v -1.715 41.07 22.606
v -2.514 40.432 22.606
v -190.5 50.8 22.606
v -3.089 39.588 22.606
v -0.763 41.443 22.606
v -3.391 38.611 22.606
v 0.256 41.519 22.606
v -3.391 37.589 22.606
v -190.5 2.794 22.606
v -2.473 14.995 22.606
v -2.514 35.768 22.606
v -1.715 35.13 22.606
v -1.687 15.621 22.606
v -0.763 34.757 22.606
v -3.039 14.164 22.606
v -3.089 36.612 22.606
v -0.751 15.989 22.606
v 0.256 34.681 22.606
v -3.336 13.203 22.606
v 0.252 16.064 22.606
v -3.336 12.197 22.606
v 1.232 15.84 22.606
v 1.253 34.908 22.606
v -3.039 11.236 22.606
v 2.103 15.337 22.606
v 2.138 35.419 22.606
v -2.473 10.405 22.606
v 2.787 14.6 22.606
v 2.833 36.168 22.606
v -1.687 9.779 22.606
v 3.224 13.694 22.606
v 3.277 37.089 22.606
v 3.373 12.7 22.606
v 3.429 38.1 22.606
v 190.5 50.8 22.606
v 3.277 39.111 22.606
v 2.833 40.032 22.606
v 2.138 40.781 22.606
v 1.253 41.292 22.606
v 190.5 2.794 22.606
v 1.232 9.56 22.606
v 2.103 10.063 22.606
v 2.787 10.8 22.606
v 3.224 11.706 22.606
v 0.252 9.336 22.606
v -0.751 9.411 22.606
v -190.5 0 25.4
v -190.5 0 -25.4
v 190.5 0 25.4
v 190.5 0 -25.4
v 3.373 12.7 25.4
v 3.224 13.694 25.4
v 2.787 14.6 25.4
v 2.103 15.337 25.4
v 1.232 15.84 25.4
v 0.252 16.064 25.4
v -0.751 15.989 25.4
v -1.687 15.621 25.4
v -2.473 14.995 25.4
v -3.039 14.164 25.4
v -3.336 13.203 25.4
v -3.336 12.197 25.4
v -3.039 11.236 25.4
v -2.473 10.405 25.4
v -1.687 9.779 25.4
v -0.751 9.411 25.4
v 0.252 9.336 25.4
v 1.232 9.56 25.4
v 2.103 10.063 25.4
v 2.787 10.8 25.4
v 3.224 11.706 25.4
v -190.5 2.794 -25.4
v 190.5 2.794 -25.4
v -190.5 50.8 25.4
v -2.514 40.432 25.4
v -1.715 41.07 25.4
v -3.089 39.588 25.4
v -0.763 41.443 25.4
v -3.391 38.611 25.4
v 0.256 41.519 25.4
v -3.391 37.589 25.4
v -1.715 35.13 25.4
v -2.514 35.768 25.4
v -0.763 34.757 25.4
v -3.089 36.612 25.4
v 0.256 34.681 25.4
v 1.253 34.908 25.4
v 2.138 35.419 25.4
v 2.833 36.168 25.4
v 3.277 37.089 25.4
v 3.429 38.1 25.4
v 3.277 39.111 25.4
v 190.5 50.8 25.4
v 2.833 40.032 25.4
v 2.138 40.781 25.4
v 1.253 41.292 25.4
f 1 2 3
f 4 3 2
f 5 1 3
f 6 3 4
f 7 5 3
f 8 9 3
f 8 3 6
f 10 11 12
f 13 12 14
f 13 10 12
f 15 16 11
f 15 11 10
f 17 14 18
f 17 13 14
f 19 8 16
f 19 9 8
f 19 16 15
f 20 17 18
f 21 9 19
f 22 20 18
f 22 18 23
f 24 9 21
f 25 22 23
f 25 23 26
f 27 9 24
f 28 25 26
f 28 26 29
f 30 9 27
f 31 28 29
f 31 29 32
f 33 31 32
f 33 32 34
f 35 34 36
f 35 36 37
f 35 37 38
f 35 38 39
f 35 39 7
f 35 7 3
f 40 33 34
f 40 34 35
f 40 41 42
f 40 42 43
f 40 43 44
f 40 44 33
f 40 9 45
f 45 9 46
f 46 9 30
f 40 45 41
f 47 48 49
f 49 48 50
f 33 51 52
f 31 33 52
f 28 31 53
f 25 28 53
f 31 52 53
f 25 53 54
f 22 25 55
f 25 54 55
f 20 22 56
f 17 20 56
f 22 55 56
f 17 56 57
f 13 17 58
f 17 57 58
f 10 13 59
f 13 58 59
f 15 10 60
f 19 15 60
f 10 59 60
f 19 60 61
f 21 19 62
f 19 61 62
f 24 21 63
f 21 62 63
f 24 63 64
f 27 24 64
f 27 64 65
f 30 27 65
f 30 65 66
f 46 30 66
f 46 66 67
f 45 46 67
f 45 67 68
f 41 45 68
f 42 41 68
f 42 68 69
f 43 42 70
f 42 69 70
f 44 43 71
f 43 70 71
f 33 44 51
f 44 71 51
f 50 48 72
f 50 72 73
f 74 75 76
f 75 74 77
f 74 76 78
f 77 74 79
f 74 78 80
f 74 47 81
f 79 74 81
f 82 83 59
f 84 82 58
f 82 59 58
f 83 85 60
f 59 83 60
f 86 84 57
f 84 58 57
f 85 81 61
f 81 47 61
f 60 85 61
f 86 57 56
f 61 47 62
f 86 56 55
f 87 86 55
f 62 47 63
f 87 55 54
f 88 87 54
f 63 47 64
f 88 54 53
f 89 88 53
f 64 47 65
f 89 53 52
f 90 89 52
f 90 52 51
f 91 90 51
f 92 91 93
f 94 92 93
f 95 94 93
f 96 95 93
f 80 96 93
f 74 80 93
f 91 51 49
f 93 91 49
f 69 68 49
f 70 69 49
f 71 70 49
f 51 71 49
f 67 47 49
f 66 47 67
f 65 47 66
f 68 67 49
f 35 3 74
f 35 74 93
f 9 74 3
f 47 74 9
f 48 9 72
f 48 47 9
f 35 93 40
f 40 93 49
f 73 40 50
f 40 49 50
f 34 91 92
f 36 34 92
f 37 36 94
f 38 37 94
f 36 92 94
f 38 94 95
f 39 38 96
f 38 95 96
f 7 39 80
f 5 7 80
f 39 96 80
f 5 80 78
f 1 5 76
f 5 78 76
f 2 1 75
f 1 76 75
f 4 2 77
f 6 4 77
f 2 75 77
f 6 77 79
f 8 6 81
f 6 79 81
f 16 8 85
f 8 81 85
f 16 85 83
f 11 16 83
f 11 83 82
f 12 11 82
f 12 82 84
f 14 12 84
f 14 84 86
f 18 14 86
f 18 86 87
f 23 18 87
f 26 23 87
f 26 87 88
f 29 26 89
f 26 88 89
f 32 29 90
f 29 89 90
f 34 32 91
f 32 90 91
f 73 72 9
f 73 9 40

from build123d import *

# Parameters (mm, degrees)
SKETCH1_W           = 381
SKETCH1_H           = 50.8
BOSS_EXTRUDE1_DEPTH = 2.794
SKETCH2_W           = 381
SKETCH2_H           = 2.794
BOSS_EXTRUDE2_DEPTH = 48.006
SKETCH3_R           = 3.429
SKETCH3_R_2         = 3.3734375
CUT_EXTRUDE1_DEPTH  = 2.794


with BuildPart() as part:
    # Sketch1 → Boss-Extrude1 (new body)
    with BuildSketch(Plane(origin=(0, 0, 0), x_dir=(1, 0, 0), z_dir=(0, 1, 0))):
        Rectangle(SKETCH1_W, SKETCH1_H)
    extrude(amount=BOSS_EXTRUDE1_DEPTH)

    # Sketch2 → Boss-Extrude2 (add)
    with BuildSketch(Plane(origin=(0, 2.794, 0), x_dir=(1, 0, 0), z_dir=(0, 1, 0))):
        with Locations((0, -24.003)):
            Rectangle(SKETCH2_W, SKETCH2_H)
    extrude(amount=BOSS_EXTRUDE2_DEPTH)

    # Sketch3 → Cut-Extrude1 (cut)
    with BuildSketch(Plane.XY.offset(25.4)):
        with Locations((0, 38.1)):
            Circle(SKETCH3_R)
        with Locations((0, 12.7)):
            Circle(SKETCH3_R_2)
    extrude(amount=-CUT_EXTRUDE1_DEPTH, mode=Mode.SUBTRACT)


solid = part.part
